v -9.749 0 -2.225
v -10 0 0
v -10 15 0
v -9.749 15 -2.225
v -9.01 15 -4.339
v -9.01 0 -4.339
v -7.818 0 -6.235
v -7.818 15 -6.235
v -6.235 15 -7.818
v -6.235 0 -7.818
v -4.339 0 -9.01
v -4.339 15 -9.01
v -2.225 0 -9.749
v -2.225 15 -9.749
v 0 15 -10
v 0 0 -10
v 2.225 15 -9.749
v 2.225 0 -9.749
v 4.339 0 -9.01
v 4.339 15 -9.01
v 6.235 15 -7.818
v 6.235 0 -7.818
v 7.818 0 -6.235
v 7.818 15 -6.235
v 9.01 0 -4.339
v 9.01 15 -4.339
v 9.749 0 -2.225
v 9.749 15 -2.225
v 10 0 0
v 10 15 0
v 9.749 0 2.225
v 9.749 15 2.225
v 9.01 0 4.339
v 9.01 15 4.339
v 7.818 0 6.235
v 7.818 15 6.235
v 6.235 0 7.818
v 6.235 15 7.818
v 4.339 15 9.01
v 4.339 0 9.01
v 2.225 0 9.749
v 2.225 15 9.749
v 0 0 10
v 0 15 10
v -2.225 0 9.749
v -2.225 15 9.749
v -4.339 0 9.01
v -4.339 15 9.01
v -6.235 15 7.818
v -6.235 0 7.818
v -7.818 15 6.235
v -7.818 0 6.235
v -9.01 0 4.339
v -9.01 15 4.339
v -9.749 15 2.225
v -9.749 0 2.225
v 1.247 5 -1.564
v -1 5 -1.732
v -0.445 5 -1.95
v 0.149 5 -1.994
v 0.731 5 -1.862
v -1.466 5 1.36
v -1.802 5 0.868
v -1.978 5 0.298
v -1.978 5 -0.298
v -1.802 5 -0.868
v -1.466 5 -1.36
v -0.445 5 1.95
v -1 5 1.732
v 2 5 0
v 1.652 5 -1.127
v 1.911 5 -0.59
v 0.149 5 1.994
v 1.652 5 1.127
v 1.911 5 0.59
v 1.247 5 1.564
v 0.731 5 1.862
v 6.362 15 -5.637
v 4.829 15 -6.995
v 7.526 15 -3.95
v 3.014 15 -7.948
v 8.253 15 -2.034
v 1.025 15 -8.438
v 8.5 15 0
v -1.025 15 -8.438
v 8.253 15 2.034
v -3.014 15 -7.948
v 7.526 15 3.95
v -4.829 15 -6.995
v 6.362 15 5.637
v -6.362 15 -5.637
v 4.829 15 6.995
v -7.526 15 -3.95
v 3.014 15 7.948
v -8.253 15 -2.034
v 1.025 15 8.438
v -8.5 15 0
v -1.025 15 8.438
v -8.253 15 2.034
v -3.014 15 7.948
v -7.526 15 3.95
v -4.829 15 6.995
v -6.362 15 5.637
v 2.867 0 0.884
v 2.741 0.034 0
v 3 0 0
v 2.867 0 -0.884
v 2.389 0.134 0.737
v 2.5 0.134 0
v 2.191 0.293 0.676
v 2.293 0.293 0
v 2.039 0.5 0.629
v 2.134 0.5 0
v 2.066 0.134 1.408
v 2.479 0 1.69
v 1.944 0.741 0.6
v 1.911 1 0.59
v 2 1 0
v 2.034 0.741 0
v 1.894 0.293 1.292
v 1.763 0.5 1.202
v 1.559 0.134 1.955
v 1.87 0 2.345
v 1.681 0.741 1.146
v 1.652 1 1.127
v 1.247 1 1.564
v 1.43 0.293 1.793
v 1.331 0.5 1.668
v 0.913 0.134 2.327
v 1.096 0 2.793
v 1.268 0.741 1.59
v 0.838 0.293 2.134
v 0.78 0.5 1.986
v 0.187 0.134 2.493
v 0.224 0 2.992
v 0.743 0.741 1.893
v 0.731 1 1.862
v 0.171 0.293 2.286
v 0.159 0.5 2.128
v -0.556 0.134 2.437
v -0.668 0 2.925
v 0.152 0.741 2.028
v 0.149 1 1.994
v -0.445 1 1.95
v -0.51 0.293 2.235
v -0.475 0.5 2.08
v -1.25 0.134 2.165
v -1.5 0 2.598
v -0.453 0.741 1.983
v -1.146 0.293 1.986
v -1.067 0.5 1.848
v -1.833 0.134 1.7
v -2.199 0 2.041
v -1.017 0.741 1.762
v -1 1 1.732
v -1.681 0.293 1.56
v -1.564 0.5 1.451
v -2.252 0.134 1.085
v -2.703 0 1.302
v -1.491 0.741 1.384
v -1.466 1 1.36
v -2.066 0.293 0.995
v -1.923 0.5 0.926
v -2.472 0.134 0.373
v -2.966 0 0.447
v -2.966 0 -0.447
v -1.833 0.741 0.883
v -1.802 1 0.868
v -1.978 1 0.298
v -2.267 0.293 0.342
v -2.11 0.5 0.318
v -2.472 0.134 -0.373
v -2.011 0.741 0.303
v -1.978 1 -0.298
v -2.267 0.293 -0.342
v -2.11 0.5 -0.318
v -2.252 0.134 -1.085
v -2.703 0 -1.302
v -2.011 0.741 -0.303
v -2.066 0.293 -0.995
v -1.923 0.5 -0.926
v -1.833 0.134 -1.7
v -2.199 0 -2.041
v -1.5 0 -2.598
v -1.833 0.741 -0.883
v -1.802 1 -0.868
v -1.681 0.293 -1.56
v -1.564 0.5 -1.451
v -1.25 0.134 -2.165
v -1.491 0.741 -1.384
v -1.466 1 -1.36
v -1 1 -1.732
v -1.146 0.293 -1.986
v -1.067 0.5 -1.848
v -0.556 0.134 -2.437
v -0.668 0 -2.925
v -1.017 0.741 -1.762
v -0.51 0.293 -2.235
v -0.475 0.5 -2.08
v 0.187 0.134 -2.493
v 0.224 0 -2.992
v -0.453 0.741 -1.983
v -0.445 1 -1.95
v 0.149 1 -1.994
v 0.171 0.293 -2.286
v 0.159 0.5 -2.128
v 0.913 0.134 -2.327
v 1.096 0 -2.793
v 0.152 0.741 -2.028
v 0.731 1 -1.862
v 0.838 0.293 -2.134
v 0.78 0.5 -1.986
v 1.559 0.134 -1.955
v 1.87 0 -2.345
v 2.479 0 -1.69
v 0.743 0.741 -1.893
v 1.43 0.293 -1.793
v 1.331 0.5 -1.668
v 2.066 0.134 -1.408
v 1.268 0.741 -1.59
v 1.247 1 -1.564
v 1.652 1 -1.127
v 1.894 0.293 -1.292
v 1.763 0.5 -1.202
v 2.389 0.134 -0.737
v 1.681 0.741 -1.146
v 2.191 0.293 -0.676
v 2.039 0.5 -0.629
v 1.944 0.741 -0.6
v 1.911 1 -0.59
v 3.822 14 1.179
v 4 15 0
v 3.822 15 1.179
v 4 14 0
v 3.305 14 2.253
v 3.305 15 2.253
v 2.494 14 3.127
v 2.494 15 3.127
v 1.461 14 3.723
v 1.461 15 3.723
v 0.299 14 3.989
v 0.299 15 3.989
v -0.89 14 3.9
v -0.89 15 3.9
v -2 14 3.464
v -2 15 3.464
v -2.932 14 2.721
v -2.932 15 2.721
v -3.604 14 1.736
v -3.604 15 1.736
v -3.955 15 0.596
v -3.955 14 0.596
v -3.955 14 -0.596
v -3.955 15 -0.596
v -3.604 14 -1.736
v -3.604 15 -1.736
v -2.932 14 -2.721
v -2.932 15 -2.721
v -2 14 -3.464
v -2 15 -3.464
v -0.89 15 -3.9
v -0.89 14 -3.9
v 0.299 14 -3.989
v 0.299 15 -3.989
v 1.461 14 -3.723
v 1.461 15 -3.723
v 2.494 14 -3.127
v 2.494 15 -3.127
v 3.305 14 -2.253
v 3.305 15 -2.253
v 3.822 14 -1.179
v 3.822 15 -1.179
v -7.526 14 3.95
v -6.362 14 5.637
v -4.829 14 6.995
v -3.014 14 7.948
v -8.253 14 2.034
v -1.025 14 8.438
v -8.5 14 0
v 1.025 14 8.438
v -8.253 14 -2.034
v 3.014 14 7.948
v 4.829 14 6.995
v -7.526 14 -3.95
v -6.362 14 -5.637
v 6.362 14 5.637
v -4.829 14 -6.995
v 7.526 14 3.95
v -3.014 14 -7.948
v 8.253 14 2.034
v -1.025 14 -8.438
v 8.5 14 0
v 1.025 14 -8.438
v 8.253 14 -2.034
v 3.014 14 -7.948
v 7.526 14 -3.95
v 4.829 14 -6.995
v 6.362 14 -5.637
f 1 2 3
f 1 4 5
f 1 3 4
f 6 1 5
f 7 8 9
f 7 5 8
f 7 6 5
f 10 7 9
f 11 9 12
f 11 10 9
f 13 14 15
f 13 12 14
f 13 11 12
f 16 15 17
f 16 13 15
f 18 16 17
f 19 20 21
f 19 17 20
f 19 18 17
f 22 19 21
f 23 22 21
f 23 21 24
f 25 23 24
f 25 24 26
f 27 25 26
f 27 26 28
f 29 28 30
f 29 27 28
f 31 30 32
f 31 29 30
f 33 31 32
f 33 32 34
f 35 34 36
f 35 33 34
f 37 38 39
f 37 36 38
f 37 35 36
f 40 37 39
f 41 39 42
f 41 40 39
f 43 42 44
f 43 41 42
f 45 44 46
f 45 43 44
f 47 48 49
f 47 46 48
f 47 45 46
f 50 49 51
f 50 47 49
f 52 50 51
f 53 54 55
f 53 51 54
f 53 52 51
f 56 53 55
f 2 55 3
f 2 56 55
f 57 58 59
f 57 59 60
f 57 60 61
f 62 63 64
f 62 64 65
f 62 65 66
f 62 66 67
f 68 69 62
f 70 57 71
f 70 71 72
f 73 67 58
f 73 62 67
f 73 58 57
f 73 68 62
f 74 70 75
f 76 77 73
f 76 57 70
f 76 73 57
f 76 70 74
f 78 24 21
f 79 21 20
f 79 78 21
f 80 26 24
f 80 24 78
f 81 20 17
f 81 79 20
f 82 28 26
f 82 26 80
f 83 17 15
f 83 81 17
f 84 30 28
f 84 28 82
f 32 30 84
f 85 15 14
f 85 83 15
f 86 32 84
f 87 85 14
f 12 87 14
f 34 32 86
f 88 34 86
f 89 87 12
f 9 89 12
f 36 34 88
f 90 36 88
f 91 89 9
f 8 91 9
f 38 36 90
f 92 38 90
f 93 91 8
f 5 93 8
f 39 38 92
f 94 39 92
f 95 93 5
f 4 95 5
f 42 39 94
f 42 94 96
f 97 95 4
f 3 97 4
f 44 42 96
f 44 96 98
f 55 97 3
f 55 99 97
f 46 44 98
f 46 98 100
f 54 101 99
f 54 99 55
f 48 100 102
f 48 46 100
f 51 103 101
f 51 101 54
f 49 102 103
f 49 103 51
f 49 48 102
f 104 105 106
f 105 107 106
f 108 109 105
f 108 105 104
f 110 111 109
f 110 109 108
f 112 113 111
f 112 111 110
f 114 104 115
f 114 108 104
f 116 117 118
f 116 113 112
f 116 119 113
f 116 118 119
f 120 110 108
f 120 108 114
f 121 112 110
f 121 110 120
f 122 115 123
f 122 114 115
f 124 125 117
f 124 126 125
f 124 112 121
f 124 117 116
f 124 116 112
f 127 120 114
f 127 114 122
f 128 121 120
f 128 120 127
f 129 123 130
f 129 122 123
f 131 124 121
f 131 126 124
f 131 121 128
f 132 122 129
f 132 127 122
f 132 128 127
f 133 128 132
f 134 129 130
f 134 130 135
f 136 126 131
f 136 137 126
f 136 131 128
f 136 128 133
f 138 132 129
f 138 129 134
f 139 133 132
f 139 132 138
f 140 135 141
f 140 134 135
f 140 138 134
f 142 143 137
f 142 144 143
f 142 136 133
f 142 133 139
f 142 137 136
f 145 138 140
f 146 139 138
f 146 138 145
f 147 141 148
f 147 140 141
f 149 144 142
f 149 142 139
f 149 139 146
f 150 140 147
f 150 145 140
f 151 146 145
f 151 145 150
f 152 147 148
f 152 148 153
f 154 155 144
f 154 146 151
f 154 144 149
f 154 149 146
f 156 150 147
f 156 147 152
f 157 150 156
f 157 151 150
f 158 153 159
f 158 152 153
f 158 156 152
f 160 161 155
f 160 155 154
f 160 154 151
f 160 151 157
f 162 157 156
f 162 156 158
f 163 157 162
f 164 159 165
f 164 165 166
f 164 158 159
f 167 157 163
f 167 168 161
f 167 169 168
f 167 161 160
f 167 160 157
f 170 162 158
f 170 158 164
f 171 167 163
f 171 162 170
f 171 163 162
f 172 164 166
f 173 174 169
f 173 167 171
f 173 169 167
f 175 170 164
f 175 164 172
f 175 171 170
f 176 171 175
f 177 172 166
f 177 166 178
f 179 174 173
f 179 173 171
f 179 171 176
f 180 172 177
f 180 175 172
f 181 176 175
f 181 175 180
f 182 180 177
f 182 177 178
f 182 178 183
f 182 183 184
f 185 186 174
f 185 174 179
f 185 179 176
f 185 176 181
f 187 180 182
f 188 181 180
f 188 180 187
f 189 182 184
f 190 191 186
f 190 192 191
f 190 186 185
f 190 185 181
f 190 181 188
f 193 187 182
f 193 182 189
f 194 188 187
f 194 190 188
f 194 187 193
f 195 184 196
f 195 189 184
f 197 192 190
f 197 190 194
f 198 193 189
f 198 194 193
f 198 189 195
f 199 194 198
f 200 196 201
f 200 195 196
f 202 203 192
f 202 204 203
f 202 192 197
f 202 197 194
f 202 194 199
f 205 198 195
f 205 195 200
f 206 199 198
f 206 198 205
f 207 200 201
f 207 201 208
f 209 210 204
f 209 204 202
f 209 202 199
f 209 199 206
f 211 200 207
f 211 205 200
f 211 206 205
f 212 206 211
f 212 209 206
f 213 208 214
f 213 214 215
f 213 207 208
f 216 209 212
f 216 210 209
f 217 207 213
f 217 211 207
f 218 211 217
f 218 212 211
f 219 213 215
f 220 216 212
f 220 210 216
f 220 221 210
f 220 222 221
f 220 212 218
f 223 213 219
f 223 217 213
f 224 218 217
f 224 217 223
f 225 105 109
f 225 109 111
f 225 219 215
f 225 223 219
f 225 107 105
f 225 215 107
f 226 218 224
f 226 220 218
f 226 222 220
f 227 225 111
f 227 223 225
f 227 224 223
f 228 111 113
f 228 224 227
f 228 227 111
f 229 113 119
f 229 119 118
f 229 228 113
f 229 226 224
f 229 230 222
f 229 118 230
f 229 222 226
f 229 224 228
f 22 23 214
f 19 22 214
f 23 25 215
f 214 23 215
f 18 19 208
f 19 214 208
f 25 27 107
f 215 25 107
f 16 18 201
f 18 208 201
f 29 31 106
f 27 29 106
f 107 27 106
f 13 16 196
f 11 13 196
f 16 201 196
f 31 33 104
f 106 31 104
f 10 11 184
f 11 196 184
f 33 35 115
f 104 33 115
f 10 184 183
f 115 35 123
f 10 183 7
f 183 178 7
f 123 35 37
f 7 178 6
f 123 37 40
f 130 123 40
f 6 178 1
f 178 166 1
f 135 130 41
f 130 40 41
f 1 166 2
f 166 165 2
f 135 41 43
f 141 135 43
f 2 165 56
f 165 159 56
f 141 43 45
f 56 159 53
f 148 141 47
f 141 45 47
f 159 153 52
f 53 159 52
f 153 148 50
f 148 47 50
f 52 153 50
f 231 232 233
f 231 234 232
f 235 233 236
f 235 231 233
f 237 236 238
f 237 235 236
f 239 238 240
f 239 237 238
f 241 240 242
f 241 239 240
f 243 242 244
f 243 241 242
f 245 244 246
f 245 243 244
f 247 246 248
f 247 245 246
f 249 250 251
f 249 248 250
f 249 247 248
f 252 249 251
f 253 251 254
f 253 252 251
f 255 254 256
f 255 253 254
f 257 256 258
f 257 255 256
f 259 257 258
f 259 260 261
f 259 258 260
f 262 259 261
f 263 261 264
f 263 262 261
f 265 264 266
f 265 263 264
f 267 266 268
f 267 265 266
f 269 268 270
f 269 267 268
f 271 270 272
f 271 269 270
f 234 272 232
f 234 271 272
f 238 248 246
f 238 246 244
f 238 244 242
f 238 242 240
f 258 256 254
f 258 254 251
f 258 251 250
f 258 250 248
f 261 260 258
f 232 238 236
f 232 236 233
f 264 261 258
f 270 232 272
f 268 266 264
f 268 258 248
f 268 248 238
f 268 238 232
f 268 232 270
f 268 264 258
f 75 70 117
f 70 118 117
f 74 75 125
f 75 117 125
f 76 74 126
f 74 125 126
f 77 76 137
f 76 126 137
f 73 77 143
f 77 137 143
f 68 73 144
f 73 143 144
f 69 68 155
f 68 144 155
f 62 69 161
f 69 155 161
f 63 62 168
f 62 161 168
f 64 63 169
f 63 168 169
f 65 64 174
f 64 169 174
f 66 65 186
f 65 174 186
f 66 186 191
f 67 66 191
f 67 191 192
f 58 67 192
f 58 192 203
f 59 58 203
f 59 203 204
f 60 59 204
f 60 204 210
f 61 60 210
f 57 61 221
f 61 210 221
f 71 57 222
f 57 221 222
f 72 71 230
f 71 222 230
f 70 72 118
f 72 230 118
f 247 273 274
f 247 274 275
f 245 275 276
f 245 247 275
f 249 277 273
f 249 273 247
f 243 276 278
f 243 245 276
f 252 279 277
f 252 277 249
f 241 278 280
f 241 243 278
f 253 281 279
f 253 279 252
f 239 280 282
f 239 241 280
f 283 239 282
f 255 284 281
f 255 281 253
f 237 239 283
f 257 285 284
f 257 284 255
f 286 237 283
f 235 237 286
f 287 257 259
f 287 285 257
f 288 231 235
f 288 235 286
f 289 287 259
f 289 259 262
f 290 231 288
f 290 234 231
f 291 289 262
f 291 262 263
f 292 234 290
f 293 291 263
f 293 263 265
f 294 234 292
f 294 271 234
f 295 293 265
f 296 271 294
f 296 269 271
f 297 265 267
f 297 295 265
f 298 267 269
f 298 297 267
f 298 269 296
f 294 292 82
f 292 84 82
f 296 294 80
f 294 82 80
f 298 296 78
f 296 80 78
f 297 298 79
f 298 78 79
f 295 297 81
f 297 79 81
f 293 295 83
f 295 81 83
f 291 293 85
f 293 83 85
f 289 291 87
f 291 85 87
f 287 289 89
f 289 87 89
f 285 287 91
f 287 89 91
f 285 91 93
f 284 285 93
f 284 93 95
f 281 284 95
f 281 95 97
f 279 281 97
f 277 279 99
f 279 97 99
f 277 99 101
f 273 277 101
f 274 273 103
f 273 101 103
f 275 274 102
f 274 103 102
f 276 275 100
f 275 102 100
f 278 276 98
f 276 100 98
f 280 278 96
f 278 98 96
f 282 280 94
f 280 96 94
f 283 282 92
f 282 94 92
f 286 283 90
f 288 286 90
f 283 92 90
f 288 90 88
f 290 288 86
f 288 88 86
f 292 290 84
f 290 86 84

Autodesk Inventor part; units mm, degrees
ref_plane "YZ Plane" through (0, 0, 0) normal (1, 0, 0) x (0, 1, 0)
ref_plane "XZ Plane" through (0, 0, 0) normal (0, 1, 0) x (-1, 0, 0)
ref_plane "XY Plane" through (0, 0, 0) normal (0, 0, 1) x (1, 0, 0)
sketch "Sketch1" plane through (0, 0, 0) normal (0, 1, 0) x (-1, 0, 0)
  circle A0 centre (0, 0) radius 10
  dimension "d0" = 20
extrude "Extrusion1" add sketch "Sketch1" along normal blind 15
sketch "Sketch2" plane through (0, 15, 0) normal (0, 1, 0) x (1, 0, 0)
  circle A0 centre (0, 0) radius 8.5
  dimension "d5" = 17
extrude "Extrusion2" cut sketch "Sketch2" against normal blind 1
sketch "Sketch3" plane through (0, 14, 0) normal (0, 1, 0) x (1, 0, 0)
  circle A0 centre (0, 0) radius 4
  dimension "d8" = 8
extrude "Extrusion3" add sketch "Sketch3" along normal blind 1
sketch "Sketch4" plane through (0, 0, 0) normal (0, -1, 0) x (1, 0, 0)
  circle A0 centre (0, 0) radius 2
  dimension "d11" = 4
extrude "Extrusion4" cut sketch "Sketch4" against normal blind 5
sketch "Sketch5" plane through (0, 0, 0) normal (0, -1, 0) x (1, 0, 0)
  point P0 (0, 0)
fillet "Fillet1" radius 1 1 edges at (-2, 0, 0)
thread "Thread1" size "M4x0.7" class "6H" standard "ANSI Metric M Profile" full length
properties part number "Eletroima" material "Iron, Cast"
